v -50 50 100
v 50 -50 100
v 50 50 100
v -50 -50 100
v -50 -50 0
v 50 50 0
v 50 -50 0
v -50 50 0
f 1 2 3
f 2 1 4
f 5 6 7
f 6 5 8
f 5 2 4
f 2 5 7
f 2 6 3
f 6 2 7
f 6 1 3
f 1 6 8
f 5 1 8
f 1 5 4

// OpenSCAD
length=100;
width=100;
height=100;

translate([-(length/2),-(width/2),0]){
    cube([length,width,height]);
}
